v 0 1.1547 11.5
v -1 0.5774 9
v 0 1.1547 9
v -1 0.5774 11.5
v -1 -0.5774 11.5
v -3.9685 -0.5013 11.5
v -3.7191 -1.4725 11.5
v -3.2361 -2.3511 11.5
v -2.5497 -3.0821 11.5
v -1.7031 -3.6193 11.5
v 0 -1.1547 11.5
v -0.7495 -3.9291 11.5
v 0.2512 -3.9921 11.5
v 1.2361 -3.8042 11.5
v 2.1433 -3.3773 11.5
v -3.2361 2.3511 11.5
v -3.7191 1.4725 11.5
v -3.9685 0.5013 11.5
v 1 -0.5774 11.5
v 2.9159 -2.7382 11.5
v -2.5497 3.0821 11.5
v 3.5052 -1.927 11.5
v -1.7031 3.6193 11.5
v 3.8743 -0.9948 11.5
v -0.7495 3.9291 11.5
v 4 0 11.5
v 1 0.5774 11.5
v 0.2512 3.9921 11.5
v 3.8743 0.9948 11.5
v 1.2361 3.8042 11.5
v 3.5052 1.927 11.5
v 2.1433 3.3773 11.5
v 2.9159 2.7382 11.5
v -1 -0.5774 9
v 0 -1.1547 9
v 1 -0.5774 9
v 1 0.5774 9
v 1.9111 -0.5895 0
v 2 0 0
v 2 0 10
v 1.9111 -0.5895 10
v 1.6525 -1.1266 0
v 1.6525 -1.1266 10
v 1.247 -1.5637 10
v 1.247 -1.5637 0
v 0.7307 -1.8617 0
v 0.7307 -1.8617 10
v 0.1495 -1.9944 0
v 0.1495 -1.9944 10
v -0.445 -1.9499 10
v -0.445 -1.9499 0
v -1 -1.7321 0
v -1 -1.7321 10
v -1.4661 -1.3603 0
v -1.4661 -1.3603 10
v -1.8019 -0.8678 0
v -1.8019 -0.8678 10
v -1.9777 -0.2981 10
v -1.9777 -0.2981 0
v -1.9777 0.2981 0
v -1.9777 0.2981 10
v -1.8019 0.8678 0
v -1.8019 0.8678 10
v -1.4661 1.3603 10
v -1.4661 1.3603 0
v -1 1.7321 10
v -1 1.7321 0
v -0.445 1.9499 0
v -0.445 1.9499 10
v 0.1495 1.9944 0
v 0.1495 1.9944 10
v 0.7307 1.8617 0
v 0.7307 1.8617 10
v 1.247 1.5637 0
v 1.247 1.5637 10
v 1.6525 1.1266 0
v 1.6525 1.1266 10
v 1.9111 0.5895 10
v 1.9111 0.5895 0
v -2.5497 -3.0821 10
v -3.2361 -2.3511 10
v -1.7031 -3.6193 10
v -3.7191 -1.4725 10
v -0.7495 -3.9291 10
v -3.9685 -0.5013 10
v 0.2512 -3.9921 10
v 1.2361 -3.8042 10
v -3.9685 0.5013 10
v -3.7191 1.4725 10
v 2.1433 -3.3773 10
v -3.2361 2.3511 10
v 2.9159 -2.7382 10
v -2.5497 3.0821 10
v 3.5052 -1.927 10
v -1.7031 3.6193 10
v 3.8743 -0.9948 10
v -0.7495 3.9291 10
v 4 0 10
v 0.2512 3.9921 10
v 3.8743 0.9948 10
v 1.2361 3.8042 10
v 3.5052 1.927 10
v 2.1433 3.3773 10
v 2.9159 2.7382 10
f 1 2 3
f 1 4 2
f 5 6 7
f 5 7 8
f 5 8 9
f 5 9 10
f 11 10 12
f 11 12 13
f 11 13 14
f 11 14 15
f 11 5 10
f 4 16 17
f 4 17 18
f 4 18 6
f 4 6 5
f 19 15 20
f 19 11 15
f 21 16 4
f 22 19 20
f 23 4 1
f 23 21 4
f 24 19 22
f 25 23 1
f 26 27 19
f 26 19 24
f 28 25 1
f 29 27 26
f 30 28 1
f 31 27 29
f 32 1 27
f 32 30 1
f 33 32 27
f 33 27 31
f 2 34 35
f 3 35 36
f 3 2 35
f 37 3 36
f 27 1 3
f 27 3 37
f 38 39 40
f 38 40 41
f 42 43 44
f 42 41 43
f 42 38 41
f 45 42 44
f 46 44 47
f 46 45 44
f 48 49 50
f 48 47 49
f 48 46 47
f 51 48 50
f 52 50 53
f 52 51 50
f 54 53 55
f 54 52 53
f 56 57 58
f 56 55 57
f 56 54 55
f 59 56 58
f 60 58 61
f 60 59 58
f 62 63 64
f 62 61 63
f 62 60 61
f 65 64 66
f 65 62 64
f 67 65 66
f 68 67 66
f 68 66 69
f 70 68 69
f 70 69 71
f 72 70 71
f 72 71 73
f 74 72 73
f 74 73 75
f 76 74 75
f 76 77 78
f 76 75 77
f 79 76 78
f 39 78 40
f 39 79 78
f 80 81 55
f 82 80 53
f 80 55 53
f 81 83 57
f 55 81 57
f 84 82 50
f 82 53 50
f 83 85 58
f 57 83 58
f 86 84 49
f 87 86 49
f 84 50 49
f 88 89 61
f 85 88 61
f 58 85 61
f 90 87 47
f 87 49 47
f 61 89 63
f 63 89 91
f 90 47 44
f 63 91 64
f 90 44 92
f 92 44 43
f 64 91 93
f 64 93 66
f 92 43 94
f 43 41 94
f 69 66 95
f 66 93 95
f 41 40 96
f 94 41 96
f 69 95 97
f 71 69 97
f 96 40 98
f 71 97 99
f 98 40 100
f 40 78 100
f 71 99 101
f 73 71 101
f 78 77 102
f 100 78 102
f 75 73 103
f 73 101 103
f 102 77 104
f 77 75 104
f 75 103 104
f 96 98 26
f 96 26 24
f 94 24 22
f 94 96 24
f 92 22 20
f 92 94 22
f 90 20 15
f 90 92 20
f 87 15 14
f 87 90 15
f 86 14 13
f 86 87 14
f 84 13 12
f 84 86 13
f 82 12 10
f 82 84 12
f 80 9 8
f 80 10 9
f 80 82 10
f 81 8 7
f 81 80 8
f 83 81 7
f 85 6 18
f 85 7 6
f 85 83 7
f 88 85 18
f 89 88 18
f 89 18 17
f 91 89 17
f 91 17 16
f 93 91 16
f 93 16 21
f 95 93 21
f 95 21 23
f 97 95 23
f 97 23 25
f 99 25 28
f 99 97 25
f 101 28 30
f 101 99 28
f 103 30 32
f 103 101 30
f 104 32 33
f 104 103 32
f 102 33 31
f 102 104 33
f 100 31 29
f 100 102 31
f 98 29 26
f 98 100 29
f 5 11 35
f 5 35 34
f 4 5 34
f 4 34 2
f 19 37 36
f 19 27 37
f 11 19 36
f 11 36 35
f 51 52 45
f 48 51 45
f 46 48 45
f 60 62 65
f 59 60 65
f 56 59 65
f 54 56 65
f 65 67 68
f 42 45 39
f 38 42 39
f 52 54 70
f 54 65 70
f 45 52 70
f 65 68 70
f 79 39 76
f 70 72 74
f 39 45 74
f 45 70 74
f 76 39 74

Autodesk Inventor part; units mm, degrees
ref_plane "YZ Plane" through (0, 0, 0) normal (1, 0, 0) x (0, 1, 0)
ref_plane "XZ Plane" through (0, 0, 0) normal (0, 1, 0) x (-1, 0, 0)
ref_plane "XY Plane" through (0, 0, 0) normal (0, 0, 1) x (1, 0, 0)
sketch "スケッチ1" plane through (0, 0, 0) normal (0, 0, 1) x (1, 0, 0)
  circle A0 centre (0, 0) radius 2
  dimension "d0" = 4
extrude "押し出し1" add sketch "スケッチ1" along normal blind 10
thread "ねじ1" size "M4x0.7" class "6g" standard "ANSI Metric M Profile" full length
sketch "スケッチ2" plane through (0, 0, 10) normal (0, 0, 1) x (1, 0, 0)
  circle A0 centre (0, 0) radius 4
  dimension "d5" = 8
extrude "押し出し2" add sketch "スケッチ2" along normal blind 1.5
sketch "スケッチ3" plane through (0, 0, 11.5) normal (0, 0, 1) x (1, 0, 0)
  line L0 (0, 1.1547) -> (1, 0.5774)
  line L1 (1, 0.5774) -> (1, -0.5774)
  line L2 (1, -0.5774) -> (0, -1.1547)
  line L3 (0, -1.1547) -> (-1, -0.5774)
  line L4 (-1, -0.5774) -> (-1, 0.5774)
  line L5 (-1, 0.5774) -> (0, 1.1547)
  point P0 (0, 0)
  point P1 (0, 0)
  dimension "d8" = 2
extrude "押し出し3" cut sketch "スケッチ3" against normal blind 2.5
properties part number "M4極低頭ネジ　10" material "鋼、高強度、低合金"
